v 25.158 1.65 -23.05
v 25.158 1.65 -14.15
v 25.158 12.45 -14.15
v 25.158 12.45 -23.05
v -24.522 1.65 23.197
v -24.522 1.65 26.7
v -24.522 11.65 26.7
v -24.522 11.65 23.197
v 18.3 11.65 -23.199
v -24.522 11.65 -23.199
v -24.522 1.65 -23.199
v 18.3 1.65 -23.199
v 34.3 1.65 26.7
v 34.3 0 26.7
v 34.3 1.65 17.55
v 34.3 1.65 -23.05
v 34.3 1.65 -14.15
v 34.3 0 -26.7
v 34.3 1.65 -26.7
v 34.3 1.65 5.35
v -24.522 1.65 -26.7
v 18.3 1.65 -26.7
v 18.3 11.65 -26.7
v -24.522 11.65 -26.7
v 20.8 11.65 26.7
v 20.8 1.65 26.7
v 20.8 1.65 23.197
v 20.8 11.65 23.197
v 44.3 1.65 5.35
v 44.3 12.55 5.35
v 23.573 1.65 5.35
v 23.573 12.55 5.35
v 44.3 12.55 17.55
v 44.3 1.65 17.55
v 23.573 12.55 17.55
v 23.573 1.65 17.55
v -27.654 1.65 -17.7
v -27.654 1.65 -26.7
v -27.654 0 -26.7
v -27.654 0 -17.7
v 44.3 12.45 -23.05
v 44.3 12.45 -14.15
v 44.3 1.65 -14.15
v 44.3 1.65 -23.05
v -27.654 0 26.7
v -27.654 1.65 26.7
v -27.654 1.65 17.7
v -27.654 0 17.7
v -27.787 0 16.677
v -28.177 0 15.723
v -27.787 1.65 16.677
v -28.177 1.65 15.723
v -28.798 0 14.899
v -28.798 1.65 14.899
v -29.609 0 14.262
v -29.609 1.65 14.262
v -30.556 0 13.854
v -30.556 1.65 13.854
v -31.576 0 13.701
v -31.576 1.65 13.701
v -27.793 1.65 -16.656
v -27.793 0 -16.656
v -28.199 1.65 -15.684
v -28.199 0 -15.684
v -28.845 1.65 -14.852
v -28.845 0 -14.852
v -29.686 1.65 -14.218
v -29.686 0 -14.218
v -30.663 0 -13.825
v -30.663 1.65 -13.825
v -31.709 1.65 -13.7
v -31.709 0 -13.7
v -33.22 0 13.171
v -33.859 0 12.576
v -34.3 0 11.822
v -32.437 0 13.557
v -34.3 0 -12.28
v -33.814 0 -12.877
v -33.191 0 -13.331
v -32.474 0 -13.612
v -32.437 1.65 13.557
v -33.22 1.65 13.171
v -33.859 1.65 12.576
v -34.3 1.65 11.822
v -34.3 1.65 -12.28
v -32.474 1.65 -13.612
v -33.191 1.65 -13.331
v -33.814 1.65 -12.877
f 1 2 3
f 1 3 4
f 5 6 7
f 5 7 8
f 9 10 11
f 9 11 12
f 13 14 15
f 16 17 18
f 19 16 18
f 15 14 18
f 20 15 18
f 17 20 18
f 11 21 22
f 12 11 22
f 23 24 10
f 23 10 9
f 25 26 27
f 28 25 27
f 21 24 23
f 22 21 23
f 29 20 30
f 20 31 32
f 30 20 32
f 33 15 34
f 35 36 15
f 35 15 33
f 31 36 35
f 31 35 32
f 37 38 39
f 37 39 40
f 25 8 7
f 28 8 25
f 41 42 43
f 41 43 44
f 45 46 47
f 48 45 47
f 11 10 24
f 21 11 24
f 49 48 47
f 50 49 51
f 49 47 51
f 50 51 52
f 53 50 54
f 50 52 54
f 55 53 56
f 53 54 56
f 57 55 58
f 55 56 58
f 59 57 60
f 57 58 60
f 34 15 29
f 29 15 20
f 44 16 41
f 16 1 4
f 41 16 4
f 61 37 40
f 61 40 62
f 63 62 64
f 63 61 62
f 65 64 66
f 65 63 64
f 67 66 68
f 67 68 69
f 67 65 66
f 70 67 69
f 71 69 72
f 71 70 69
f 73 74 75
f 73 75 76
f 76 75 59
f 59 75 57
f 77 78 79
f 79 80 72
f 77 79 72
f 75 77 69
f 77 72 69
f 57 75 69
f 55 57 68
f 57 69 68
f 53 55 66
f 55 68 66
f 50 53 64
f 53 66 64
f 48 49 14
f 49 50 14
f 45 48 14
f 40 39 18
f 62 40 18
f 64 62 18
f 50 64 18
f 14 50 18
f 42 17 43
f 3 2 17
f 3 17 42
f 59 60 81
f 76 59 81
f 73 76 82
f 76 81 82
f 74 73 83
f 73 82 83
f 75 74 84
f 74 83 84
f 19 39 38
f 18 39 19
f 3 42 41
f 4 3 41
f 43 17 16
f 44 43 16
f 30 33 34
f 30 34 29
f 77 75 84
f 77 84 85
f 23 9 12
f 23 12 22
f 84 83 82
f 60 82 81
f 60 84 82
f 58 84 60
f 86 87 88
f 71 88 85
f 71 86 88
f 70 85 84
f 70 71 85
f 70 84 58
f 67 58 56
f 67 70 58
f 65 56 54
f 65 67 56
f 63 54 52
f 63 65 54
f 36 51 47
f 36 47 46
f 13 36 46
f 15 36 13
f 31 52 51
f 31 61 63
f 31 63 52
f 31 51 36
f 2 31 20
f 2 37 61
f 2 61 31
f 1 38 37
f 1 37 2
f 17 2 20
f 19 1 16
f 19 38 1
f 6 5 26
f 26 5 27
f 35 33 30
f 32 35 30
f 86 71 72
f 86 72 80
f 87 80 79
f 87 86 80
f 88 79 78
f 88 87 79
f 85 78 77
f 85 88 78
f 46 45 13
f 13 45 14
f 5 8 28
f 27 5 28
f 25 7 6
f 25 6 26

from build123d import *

# Parameters (mm, degrees)
SKETCH1_W             = 68.6
SKETCH1_H             = 53.4
BOSS_EXTRUDE1_DEPTH   = 11.65
CUT_EXTRUDE1_DEPTH    = 11.65
CUT_EXTRUDE29_DEPTH   = 10
SKETCH3_W             = 45.321894132
SKETCH3_H             = 3.5031306
BOSS_EXTRUDE2_DEPTH   = 10
SKETCH3_W_2           = 42.821894132
SKETCH3_H_2           = 3.500805672
BOSS_EXTRUDE2_2_DEPTH = 10
SKETCH9_W             = 10.72679272
SKETCH9_H             = 12.2
BOSS_EXTRUDE3_DEPTH   = 10.9
SKETCH10_W            = 12.2
SKETCH10_H            = 10.9
BOSS_EXTRUDE4_DEPTH   = 10
SKETCH11_W            = 9.141898724
SKETCH11_H            = 8.9
BOSS_EXTRUDE5_DEPTH   = 10.8
SKETCH12_W            = 8.9
SKETCH12_H            = 10.8
BOSS_EXTRUDE6_DEPTH   = 10


with BuildPart() as part:
    # Sketch1 → Boss-Extrude1 (new body)
    with BuildSketch(Plane(origin=(0, 0, 0), x_dir=(1, 0, 0), z_dir=(0, 1, 0))):
        Rectangle(SKETCH1_W, SKETCH1_H)
    extrude(amount=BOSS_EXTRUDE1_DEPTH)

    # Sketch2 → Cut-Extrude1 (cut)
    with BuildSketch(Plane(origin=(0, 11.65, 0), x_dir=(1, 0, 0), z_dir=(0, 1, 0))):
        with BuildLine():
            Line((-34.3, -26.7), (-27.654315978, -26.7))
            Line((-27.654315978, -26.7), (-27.654315978, -17.7))
            ThreePointArc((-27.654315978, -17.7), (-28.79828375, -14.89945007), (-31.575855934, -13.700769571))
            ThreePointArc((-31.575855934, -13.700769571), (-33.220484723, -13.170795461), (-34.3, -11.821601932))
            Line((-34.3, -11.821601932), (-34.3, -26.7))
        make_face()
        with BuildLine():
            ThreePointArc((-27.654315978, 17.7), (-28.845145426, 14.852446522), (-31.708596382, 13.700368312))
            ThreePointArc((-31.708596382, 13.700368312), (-33.191338295, 13.331337389), (-34.3, 12.279873349))
            Line((-34.3, 12.279873349), (-34.3, 26.7))
            Line((-34.3, 26.7), (-27.654315978, 26.7))
            Line((-27.654315978, 26.7), (-27.654315978, 17.7))
        make_face()
    extrude(amount=-CUT_EXTRUDE1_DEPTH, mode=Mode.SUBTRACT)

    # Sketch7 → Cut-Extrude29 (cut)
    with BuildSketch(Plane(origin=(0, 11.65, 0), x_dir=(1, 0, 0), z_dir=(0, 1, 0))):
        with BuildLine():
            Line((-27.654315978, -17.7), (-27.654315978, -26.7))
            Line((-27.654315978, -26.7), (34.3, -26.7))
            Line((34.3, -26.7), (34.3, 26.7))
            Line((34.3, 26.7), (-27.654315978, 26.7))
            Line((-27.654315978, 26.7), (-27.654315978, 17.7))
            ThreePointArc((-27.654315978, 17.7), (-28.845145426, 14.852446522), (-31.708596382, 13.700368312))
            ThreePointArc((-31.708596382, 13.700368312), (-33.191338295, 13.331337389), (-34.3, 12.279873349))
            Line((-34.3, 12.279873349), (-34.3, -11.821601932))
            ThreePointArc((-34.3, -11.821601932), (-33.220484723, -13.170795461), (-31.575855934, -13.700769571))
            ThreePointArc((-31.575855934, -13.700769571), (-28.79828375, -14.89945007), (-27.654315978, -17.7))
        make_face()
    extrude(amount=-CUT_EXTRUDE29_DEPTH, mode=Mode.SUBTRACT)

    # Sketch9 → Boss-Extrude3 (add)
    with BuildSketch(Plane(origin=(0, 1.65, 0), x_dir=(1, 0, 0), z_dir=(0, 1, 0))):
        with Locations((28.93660364, -11.45)):
            Rectangle(SKETCH9_W, SKETCH9_H)
    extrude(amount=BOSS_EXTRUDE3_DEPTH)

    # Sketch10 → Boss-Extrude4 (add)
    with BuildSketch(Plane(origin=(34.3, 0, 0), x_dir=(0, 0, -1), z_dir=(1, 0, 0))):
        with Locations((-11.45, 7.1)):
            Rectangle(SKETCH10_W, SKETCH10_H)
    extrude(amount=BOSS_EXTRUDE4_DEPTH)

    # Sketch11 → Boss-Extrude5 (add)
    with BuildSketch(Plane(origin=(0, 1.65, 0), x_dir=(1, 0, 0), z_dir=(0, 1, 0))):
        with Locations((29.729050638, 18.6)):
            Rectangle(SKETCH11_W, SKETCH11_H)
    extrude(amount=BOSS_EXTRUDE5_DEPTH)

    # Sketch12 → Boss-Extrude6 (add)
    with BuildSketch(Plane(origin=(34.3, 0, 0), x_dir=(0, 0, -1), z_dir=(1, 0, 0))):
        with Locations((18.6, 7.05)):
            Rectangle(SKETCH12_W, SKETCH12_H)
    extrude(amount=BOSS_EXTRUDE6_DEPTH)


with BuildPart() as body_2:
    # Sketch3 → Boss-Extrude2 (new body)
    with BuildSketch(Plane(origin=(0, 11.65, 0), x_dir=(1, 0, 0), z_dir=(0, 1, 0))):
        with Locations((-1.860947066, -24.9484347)):
            Rectangle(SKETCH3_W, SKETCH3_H)
    extrude(amount=-BOSS_EXTRUDE2_DEPTH)


with BuildPart() as body_3:
    # Sketch3 → Boss-Extrude2 2 (new body)
    with BuildSketch(Plane(origin=(0, 11.65, 0), x_dir=(1, 0, 0), z_dir=(0, 1, 0))):
        with Locations((-3.110947066, 24.949597164)):
            Rectangle(SKETCH3_W_2, SKETCH3_H_2)
    extrude(amount=-BOSS_EXTRUDE2_2_DEPTH)


solid = Compound([part.part, body_2.part, body_3.part])
